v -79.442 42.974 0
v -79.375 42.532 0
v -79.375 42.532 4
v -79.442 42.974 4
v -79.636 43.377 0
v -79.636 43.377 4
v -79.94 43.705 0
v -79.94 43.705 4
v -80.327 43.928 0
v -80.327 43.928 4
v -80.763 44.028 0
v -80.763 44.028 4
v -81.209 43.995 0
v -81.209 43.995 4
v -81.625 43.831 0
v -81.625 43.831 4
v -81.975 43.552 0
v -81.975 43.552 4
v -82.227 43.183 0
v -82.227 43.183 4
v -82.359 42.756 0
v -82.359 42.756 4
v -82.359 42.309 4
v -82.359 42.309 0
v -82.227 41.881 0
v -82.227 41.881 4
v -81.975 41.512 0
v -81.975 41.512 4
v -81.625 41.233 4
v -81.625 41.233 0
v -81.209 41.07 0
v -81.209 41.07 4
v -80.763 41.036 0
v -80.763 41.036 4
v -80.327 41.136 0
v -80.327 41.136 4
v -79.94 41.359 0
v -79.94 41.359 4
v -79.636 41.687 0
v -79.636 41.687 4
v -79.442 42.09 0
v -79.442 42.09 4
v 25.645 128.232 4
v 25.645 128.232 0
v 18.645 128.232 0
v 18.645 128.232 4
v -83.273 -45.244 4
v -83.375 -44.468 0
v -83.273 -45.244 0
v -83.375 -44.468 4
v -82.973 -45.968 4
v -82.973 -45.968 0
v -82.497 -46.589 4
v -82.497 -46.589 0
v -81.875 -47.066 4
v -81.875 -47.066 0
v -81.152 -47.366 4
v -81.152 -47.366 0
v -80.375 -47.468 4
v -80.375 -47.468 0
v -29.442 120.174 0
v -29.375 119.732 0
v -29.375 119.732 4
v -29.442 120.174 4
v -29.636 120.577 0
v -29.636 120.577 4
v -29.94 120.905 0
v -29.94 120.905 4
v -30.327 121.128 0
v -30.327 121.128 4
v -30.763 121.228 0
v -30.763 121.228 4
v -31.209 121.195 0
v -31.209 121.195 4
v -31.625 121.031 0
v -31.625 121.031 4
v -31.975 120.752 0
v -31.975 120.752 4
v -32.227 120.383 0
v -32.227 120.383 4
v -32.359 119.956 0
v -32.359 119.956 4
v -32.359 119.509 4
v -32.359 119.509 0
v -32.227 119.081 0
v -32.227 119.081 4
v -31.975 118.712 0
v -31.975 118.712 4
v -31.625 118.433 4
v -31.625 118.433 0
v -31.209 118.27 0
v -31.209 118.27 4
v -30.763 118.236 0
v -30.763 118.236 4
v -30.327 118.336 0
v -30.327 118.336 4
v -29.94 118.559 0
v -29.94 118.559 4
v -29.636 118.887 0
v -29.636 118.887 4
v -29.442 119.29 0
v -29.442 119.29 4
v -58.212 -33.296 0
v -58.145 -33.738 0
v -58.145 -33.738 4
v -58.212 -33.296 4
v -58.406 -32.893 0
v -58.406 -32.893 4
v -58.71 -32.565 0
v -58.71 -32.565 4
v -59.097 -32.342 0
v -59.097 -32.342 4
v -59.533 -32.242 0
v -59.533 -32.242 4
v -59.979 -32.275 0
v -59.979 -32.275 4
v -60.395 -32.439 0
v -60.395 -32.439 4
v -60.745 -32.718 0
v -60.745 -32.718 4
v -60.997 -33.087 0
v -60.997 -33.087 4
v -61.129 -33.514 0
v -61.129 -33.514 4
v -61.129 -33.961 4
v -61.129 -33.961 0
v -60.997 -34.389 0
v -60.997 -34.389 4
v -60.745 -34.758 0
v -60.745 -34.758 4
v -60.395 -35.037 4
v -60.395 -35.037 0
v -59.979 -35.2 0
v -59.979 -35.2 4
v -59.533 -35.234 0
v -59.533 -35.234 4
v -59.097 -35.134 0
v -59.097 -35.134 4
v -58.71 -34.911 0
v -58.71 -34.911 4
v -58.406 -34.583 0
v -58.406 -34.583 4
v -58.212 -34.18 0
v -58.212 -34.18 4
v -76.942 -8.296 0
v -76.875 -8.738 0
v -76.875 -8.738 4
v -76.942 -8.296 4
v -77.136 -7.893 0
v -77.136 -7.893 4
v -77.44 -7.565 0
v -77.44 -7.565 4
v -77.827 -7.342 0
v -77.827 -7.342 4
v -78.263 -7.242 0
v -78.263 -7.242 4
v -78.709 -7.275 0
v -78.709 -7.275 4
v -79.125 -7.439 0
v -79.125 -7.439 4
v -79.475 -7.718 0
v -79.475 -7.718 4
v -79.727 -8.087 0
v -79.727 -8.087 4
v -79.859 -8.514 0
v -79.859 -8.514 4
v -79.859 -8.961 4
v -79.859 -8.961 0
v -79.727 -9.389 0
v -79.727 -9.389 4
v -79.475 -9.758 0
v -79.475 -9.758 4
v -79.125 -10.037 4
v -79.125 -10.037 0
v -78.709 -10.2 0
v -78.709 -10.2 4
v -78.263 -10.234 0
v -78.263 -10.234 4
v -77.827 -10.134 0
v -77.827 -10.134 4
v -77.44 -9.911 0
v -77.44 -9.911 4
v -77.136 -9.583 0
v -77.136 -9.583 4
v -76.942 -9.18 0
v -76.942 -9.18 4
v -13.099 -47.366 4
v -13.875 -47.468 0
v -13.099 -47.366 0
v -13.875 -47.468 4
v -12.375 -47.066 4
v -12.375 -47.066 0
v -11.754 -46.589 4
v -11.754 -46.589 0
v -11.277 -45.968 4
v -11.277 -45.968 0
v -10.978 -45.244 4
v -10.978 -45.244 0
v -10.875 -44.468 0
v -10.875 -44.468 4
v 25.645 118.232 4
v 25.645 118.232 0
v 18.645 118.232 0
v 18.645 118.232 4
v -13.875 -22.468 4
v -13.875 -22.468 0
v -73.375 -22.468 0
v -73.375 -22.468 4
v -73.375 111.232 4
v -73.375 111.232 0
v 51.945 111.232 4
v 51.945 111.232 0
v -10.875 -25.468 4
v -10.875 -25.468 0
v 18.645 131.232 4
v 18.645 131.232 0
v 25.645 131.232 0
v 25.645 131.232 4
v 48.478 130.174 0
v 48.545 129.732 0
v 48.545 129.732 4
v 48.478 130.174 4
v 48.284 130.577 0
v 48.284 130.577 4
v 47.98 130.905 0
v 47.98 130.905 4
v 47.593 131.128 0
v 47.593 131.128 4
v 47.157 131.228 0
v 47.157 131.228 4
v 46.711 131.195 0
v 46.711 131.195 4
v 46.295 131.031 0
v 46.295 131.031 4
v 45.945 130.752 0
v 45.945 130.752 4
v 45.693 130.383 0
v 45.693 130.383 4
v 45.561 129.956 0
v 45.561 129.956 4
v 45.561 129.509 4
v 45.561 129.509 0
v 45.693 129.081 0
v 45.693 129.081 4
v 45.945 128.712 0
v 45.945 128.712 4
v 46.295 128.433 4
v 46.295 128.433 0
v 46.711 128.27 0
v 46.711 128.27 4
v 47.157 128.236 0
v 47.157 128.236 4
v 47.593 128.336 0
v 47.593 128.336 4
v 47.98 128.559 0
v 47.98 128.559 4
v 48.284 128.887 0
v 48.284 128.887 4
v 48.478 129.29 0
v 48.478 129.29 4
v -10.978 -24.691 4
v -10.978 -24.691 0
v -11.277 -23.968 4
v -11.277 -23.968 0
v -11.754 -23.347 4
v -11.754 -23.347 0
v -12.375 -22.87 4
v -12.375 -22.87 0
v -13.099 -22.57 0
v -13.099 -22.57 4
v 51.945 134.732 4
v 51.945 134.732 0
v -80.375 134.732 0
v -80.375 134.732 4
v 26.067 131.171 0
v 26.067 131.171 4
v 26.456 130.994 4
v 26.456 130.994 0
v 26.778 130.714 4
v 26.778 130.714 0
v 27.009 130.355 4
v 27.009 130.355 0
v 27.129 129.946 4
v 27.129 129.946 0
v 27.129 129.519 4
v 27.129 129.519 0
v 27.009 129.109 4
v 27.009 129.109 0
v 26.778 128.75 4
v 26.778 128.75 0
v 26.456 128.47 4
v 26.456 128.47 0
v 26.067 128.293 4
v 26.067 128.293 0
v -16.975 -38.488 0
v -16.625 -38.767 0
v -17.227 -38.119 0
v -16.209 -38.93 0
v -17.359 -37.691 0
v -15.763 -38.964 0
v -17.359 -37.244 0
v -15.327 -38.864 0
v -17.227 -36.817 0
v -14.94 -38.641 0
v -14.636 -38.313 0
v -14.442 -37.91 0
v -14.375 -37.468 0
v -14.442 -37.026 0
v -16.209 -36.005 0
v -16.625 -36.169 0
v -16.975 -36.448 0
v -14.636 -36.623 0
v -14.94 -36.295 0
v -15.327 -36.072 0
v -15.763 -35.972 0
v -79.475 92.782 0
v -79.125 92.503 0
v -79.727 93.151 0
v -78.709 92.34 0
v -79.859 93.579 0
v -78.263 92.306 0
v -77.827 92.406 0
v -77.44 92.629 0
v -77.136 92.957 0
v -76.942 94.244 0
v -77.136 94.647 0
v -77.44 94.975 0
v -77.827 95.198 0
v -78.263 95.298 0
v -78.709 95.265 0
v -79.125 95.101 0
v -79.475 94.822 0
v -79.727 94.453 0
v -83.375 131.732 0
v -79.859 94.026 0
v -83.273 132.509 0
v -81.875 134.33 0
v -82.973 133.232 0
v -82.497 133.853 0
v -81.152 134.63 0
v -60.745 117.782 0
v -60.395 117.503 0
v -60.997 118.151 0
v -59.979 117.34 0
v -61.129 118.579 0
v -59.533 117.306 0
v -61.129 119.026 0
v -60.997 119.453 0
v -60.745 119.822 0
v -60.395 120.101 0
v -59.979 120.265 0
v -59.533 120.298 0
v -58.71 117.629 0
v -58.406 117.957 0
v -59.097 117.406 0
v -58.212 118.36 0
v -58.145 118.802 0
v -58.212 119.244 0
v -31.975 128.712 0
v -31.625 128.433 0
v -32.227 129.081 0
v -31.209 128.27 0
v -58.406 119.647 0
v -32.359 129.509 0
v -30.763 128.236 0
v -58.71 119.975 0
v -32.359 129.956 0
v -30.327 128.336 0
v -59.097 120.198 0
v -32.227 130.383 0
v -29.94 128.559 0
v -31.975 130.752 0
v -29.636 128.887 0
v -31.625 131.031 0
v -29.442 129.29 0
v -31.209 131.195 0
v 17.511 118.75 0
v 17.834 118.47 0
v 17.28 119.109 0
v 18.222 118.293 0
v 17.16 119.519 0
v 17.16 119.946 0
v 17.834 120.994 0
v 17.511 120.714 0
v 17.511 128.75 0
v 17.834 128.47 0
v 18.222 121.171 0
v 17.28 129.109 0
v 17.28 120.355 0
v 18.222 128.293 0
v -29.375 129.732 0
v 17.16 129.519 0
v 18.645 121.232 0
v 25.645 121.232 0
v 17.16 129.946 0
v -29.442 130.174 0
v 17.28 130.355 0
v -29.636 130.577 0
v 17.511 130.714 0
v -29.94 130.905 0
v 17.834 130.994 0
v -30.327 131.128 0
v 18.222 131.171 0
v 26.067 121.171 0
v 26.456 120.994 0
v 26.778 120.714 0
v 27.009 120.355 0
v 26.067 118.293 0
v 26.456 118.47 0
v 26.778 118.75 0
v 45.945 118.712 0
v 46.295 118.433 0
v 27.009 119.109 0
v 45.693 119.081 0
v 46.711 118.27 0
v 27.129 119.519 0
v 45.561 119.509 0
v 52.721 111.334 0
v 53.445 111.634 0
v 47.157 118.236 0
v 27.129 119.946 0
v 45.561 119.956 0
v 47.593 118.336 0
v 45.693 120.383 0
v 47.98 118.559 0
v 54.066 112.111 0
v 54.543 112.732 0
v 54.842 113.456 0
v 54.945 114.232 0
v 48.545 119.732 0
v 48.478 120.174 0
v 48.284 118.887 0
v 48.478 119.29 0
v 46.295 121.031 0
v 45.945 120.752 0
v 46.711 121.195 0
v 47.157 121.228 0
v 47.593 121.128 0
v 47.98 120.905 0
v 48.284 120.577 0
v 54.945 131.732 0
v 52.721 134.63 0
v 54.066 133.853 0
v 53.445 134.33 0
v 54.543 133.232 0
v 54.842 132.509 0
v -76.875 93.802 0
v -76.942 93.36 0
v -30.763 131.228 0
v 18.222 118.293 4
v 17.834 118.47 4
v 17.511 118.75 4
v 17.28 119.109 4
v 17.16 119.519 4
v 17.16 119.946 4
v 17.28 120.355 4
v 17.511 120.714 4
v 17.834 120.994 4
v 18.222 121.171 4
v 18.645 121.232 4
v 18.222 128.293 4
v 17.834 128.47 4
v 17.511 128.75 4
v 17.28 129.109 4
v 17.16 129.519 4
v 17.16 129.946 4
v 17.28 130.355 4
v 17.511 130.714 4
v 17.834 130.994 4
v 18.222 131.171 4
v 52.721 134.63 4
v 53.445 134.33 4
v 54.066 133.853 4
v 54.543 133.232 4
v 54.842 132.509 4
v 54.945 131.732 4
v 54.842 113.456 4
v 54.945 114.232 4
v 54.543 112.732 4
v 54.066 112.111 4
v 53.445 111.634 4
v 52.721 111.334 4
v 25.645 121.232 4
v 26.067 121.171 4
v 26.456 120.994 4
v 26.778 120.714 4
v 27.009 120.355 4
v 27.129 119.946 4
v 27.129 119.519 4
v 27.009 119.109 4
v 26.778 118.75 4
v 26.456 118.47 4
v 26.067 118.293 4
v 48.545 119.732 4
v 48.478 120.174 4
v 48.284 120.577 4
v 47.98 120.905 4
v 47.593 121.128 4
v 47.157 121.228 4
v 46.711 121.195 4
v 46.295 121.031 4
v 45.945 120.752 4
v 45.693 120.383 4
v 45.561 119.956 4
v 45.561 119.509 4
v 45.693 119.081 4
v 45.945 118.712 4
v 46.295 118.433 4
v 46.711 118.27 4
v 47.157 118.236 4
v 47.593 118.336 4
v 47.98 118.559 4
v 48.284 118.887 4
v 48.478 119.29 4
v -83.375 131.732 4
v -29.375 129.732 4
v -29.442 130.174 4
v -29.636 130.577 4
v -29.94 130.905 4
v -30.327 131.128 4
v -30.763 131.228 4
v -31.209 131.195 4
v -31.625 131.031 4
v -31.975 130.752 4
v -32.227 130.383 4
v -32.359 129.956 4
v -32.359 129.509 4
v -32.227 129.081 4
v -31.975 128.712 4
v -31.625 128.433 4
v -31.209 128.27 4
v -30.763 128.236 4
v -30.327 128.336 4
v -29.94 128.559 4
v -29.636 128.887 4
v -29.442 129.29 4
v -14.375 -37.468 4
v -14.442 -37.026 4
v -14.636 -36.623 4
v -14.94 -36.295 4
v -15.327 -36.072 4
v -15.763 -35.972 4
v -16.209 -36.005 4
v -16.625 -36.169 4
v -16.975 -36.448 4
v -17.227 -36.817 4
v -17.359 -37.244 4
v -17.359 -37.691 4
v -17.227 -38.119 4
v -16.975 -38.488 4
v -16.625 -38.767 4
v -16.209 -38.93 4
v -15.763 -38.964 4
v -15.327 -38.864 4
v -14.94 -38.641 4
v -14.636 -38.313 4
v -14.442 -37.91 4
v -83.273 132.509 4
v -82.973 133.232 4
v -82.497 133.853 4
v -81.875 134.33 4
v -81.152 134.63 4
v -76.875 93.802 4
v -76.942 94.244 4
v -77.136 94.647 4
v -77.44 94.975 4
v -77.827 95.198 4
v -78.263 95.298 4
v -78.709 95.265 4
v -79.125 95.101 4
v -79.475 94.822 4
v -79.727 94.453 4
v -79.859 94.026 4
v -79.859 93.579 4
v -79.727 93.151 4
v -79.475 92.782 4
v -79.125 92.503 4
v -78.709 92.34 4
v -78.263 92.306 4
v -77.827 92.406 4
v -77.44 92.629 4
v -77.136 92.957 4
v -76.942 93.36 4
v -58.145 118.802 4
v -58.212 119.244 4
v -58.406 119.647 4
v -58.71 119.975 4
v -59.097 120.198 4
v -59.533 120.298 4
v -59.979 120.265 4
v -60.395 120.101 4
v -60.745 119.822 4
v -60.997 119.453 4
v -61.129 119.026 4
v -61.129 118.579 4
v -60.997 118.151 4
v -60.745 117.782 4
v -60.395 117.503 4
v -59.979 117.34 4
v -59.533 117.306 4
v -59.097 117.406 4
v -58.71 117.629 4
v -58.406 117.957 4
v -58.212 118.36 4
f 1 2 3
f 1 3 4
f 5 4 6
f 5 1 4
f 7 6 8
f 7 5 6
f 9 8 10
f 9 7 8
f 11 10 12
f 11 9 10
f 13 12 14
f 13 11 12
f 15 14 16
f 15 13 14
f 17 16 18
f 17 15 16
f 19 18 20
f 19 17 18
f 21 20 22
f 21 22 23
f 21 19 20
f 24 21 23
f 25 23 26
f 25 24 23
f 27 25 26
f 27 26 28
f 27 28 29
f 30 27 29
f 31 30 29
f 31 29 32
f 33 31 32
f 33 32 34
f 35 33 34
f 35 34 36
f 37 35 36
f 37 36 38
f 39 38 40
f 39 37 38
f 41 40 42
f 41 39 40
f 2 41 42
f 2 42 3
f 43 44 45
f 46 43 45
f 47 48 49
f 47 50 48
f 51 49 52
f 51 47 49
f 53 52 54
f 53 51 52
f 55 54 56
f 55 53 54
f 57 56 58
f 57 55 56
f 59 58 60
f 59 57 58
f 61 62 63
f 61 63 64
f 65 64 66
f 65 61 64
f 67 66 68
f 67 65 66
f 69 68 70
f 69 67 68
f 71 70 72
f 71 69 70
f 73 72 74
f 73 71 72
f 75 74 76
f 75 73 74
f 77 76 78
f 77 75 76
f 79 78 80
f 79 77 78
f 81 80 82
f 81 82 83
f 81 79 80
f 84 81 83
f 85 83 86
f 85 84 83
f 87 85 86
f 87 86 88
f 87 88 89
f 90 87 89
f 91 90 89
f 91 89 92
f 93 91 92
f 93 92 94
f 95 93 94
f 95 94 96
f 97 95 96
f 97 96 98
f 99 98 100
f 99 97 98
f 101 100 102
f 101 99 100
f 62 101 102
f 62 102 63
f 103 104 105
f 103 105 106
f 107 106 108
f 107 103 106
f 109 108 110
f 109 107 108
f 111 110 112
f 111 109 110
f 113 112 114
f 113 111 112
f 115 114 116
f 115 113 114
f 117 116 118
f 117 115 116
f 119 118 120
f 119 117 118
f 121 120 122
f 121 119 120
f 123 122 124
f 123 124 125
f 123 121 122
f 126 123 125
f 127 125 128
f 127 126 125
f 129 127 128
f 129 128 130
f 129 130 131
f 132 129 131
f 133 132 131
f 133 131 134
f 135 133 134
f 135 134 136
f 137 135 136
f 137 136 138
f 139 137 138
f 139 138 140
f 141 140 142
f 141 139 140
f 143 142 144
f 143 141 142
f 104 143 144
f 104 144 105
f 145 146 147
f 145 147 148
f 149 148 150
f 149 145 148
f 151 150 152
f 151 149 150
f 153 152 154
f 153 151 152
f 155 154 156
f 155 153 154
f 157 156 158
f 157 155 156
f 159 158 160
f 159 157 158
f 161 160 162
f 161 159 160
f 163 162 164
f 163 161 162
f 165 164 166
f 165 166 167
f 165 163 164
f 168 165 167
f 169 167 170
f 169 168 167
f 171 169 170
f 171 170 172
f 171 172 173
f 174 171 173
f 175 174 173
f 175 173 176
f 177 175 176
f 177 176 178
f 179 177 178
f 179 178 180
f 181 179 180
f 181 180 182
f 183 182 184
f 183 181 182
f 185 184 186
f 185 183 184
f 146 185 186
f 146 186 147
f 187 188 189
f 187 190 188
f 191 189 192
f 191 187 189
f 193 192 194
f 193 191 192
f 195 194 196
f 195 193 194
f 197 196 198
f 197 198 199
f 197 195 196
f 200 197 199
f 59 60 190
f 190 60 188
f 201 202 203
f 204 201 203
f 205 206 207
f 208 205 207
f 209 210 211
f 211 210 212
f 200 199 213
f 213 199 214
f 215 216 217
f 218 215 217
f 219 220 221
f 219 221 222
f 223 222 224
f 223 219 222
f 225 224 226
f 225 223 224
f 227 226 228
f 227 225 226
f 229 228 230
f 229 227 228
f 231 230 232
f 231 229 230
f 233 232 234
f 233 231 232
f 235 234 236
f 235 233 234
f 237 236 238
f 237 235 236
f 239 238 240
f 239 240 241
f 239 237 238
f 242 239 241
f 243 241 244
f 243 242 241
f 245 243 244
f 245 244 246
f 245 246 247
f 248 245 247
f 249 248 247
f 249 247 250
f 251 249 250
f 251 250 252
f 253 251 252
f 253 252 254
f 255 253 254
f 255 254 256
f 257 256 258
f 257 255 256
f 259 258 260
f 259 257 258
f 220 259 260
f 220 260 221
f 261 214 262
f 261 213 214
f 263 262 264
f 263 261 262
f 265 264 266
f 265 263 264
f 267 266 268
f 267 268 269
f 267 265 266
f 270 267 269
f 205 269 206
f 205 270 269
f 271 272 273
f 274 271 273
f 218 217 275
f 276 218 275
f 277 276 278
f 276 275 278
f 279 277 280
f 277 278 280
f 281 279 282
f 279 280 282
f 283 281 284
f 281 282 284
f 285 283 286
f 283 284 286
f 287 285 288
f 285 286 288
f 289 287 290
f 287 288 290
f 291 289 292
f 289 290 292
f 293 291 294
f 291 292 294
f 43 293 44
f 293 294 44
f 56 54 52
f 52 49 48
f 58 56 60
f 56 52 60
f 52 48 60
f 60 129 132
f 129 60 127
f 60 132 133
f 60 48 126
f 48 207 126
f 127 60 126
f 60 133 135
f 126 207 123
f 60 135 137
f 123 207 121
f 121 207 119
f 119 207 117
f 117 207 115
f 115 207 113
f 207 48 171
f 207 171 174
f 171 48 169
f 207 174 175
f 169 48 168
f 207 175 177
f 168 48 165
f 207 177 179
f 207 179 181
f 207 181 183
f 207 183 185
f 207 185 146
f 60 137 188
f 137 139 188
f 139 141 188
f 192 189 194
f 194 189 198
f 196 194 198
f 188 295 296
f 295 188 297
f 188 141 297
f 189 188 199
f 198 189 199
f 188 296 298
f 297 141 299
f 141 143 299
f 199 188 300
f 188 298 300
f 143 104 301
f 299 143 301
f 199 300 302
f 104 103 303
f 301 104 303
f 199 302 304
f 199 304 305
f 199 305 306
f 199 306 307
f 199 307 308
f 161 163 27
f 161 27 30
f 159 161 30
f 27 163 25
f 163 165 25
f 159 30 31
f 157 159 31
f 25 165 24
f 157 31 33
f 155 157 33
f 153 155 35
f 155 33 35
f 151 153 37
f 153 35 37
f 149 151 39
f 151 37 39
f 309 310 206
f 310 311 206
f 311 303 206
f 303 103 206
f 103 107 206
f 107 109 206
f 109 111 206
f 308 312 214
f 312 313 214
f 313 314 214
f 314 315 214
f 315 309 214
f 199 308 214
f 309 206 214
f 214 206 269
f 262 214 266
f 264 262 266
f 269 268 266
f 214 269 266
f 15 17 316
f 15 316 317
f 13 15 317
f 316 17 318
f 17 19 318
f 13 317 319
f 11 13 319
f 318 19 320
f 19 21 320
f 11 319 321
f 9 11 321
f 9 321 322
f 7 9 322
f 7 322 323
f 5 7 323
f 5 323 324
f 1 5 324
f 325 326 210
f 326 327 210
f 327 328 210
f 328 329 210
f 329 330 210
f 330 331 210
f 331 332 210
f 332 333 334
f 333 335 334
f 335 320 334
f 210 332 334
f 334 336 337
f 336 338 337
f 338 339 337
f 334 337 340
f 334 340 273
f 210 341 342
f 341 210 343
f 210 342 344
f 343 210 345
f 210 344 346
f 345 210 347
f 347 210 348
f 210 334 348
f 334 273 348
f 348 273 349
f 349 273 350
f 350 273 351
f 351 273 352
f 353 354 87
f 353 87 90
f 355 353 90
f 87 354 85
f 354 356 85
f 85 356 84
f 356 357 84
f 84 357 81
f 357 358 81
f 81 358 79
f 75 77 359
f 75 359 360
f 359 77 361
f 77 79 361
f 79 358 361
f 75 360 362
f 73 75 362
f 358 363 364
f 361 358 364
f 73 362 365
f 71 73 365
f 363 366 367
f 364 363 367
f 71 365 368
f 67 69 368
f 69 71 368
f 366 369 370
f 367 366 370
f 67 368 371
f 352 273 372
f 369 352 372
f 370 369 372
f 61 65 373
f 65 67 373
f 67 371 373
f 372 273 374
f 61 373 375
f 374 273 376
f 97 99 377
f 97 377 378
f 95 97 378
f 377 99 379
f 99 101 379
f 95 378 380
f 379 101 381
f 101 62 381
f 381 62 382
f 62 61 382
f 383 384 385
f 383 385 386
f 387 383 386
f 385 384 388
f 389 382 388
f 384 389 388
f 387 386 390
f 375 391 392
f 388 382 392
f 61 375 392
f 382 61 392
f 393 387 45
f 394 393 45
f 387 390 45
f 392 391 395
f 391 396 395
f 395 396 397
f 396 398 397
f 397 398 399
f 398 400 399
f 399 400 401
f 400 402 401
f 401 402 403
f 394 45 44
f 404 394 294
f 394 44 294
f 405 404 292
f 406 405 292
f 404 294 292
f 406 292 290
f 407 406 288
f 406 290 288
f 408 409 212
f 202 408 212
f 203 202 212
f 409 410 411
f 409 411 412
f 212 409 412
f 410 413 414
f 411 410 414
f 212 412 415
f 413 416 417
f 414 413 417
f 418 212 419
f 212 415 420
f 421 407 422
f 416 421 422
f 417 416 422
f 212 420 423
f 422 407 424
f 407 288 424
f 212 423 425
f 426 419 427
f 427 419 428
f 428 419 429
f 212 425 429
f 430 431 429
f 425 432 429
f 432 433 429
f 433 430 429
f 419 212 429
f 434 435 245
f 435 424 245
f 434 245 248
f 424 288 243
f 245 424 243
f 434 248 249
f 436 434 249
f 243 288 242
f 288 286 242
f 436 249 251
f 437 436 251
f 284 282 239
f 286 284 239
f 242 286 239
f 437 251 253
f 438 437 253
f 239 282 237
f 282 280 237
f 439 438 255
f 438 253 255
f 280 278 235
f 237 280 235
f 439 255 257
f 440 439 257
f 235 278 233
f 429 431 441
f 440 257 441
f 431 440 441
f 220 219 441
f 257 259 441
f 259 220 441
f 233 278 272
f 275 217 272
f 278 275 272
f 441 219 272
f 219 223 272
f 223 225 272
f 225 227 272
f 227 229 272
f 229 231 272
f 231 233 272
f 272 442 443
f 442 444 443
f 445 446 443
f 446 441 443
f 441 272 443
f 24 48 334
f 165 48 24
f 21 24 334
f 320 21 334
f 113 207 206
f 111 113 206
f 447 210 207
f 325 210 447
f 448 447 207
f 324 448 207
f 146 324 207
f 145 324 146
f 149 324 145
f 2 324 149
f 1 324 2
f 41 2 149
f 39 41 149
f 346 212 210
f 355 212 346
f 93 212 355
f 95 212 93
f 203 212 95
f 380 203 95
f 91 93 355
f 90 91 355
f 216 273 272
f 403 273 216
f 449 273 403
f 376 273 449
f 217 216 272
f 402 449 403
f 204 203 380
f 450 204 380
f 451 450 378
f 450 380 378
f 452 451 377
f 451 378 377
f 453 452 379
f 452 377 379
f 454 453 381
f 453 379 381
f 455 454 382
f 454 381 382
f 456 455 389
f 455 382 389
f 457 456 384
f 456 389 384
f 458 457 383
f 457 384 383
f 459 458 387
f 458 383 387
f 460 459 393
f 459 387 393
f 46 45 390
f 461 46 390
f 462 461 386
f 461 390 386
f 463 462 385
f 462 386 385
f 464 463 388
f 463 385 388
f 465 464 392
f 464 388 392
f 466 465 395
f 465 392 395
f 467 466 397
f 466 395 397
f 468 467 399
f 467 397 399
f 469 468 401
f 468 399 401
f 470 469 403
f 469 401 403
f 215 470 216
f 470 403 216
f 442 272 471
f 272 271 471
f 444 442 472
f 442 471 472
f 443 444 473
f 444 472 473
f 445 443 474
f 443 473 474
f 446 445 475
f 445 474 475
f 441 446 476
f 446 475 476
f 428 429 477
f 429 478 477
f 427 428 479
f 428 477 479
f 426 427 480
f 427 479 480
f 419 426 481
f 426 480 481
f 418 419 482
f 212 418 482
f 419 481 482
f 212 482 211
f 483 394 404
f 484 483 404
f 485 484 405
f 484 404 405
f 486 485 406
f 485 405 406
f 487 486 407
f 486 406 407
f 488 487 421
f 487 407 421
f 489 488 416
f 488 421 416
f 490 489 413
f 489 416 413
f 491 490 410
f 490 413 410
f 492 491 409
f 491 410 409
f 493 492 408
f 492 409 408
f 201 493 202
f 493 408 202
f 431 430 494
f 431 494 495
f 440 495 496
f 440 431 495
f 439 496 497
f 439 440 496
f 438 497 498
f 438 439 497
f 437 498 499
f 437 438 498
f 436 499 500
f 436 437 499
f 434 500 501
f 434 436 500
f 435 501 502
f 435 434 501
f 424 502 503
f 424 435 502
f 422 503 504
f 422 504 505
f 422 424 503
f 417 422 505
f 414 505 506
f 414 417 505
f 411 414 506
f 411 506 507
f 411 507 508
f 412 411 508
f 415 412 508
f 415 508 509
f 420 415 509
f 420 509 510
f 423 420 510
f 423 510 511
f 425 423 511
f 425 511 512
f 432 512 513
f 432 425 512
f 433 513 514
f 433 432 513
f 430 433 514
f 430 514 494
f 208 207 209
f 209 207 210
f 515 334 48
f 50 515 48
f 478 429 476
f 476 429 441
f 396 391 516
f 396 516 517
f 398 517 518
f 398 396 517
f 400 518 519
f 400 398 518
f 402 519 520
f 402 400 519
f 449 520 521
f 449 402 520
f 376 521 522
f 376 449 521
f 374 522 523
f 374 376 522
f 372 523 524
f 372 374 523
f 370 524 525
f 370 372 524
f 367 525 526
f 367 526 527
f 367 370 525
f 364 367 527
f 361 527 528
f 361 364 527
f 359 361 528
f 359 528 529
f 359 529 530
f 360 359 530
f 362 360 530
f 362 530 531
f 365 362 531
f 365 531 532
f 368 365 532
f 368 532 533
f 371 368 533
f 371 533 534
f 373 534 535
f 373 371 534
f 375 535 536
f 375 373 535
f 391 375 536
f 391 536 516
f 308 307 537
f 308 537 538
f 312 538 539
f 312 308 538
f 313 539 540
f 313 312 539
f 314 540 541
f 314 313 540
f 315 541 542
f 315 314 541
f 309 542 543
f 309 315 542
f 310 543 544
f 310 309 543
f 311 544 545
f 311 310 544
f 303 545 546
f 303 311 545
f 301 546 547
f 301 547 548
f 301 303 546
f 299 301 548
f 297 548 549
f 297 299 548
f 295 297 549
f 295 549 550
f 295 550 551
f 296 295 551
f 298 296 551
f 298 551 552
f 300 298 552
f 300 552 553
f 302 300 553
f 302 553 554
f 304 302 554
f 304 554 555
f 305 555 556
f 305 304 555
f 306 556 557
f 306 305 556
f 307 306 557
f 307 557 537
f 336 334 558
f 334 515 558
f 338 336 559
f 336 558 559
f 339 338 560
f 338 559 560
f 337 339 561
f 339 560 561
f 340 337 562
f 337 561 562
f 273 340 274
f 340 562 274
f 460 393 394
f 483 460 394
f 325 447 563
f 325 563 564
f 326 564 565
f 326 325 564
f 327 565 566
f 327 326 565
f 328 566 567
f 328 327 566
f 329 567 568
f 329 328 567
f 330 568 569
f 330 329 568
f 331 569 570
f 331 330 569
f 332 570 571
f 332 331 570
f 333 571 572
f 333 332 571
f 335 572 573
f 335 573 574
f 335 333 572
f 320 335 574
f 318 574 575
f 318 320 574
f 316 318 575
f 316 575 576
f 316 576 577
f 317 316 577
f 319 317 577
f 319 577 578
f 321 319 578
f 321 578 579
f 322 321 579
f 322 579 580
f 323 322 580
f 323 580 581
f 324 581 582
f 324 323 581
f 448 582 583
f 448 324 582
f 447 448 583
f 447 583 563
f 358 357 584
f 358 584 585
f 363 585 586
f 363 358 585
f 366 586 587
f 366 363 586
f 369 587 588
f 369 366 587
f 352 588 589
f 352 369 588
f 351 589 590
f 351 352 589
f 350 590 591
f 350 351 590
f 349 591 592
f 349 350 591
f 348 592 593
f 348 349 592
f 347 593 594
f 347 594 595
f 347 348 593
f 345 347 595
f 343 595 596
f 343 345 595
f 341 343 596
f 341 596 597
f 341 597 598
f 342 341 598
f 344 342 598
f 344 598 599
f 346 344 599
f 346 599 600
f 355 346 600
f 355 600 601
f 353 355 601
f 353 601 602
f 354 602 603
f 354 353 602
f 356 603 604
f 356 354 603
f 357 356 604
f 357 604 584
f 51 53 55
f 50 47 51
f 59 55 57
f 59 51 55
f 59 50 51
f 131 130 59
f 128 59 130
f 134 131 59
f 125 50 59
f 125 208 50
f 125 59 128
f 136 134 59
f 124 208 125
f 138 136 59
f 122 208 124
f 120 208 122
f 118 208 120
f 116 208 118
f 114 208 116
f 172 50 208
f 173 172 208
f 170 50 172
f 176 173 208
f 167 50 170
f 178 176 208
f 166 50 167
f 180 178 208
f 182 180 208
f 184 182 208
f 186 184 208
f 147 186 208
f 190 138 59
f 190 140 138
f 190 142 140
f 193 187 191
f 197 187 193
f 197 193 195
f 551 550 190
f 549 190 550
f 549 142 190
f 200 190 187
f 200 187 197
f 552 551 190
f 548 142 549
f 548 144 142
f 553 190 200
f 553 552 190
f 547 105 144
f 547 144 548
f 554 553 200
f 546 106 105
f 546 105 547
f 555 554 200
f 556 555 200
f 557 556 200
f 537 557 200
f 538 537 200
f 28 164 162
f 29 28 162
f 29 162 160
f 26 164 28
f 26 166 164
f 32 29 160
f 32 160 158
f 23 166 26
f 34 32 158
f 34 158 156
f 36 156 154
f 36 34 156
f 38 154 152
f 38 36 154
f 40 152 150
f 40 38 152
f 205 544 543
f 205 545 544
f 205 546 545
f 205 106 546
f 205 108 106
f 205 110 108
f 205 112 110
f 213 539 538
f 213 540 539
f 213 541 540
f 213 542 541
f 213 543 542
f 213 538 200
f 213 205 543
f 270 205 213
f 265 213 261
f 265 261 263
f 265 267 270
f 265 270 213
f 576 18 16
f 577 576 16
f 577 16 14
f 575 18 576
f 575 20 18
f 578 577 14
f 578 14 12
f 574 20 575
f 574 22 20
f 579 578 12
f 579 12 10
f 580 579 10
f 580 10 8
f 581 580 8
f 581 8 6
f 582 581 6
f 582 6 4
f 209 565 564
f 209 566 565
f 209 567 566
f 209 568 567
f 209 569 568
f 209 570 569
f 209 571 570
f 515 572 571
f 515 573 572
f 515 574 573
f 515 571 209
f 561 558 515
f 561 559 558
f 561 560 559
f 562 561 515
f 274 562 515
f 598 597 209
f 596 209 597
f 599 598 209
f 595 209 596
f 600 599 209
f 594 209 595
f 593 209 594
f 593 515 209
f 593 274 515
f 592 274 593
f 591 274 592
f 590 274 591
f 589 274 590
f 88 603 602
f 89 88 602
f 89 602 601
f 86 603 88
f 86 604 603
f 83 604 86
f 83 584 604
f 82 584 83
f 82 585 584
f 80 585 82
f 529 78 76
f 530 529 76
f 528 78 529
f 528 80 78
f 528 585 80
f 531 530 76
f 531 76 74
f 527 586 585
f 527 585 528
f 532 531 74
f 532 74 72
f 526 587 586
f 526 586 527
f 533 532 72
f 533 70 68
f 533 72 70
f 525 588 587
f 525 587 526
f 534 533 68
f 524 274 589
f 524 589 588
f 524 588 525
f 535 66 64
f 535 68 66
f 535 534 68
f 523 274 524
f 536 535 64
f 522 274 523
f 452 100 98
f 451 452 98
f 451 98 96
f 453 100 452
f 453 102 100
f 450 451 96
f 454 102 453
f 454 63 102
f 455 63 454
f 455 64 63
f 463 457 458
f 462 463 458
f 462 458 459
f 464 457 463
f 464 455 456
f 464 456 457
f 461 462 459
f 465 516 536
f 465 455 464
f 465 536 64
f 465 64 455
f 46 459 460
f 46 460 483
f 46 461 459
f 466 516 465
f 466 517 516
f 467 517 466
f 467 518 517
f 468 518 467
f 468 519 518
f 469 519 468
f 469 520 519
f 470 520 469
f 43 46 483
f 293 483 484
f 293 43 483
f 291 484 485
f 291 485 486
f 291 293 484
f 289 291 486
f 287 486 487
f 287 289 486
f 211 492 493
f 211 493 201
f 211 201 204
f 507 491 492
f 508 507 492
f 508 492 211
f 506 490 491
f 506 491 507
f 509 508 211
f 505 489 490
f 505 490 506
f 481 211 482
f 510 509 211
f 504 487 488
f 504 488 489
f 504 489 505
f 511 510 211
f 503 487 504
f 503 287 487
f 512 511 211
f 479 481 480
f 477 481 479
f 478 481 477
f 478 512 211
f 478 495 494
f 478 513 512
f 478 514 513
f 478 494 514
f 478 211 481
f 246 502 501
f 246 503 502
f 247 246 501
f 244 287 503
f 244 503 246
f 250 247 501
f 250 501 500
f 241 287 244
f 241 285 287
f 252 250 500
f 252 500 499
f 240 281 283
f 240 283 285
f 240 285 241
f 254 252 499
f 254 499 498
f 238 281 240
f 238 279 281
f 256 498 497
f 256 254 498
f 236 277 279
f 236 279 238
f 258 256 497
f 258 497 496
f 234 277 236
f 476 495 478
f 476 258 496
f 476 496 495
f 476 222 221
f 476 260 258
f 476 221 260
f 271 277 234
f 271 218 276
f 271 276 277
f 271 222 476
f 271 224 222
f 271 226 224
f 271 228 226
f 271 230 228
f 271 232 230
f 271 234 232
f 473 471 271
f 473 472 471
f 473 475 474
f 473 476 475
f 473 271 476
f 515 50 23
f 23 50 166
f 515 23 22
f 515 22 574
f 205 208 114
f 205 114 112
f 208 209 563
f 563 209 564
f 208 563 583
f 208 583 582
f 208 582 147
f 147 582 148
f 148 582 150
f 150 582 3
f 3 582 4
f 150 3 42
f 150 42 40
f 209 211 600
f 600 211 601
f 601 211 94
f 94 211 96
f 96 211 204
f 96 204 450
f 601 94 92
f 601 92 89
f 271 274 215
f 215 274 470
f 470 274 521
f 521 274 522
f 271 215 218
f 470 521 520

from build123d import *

# Parameters (mm, degrees)
SKETCH_2_R      = 1.5
EXTRUDE_3_DEPTH = 4
FILLET_1_R      = 3


with BuildPart() as part:
    # 草图2 → 凸台-拉伸3 (new body)
    with BuildSketch(Plane.XY):
        Polygon((-83.375314497, 134.732138716), (-83.375314497, -47.467861284), (-10.875314497, -47.467861284), (-10.875314497, -22.467861284), (-73.375314497, -22.467861284), (-73.375314497, 111.232138716), (54.944685503, 111.232138716), (54.944685503, 134.732138716), align=None)
        with Locations((-59.645314497, -33.737861284)):
            Circle(SKETCH_2_R, mode=Mode.SUBTRACT)
        with Locations((-15.875314497, -37.467861284)):
            Circle(SKETCH_2_R, mode=Mode.SUBTRACT)
        with Locations((-78.375314497, -8.737861284)):
            Circle(SKETCH_2_R, mode=Mode.SUBTRACT)
        with Locations((-80.875314497, 42.532138716)):
            Circle(SKETCH_2_R, mode=Mode.SUBTRACT)
        with Locations((-78.375314497, 93.802138716)):
            Circle(SKETCH_2_R, mode=Mode.SUBTRACT)
        with Locations((-59.645314497, 118.802138716)):
            Circle(SKETCH_2_R, mode=Mode.SUBTRACT)
        with Locations((-30.875314497, 119.732138716)):
            Circle(SKETCH_2_R, mode=Mode.SUBTRACT)
        with Locations((-30.875314497, 129.732138716)):
            Circle(SKETCH_2_R, mode=Mode.SUBTRACT)
        with BuildLine():
            ThreePointArc((25.644685503, 131.232138716), (27.144685503, 129.732138716), (25.644685503, 128.232138716))
            Line((25.644685503, 128.232138716), (18.644685503, 128.232138716))
            ThreePointArc((18.644685503, 128.232138716), (17.144685503, 129.732138716), (18.644685503, 131.232138716))
            Line((18.644685503, 131.232138716), (25.644685503, 131.232138716))
        make_face(mode=Mode.SUBTRACT)
        with BuildLine():
            Line((25.644685503, 118.232138716), (18.644685503, 118.232138716))
            ThreePointArc((18.644685503, 118.232138716), (17.144685503, 119.732138716), (18.644685503, 121.232138716))
            Line((18.644685503, 121.232138716), (25.644685503, 121.232138716))
            ThreePointArc((25.644685503, 121.232138716), (27.144685503, 119.732138716), (25.644685503, 118.232138716))
        make_face(mode=Mode.SUBTRACT)
        with Locations((47.044685503, 129.732138716)):
            Circle(SKETCH_2_R, mode=Mode.SUBTRACT)
        with Locations((47.044685503, 119.732138716)):
            Circle(SKETCH_2_R, mode=Mode.SUBTRACT)
    extrude(amount=EXTRUDE_3_DEPTH)

    # 圆角1
    fillet_1_edges = [part.edges().sort_by_distance(p)[0] for p in [
        (-10.875314497, -22.467861284, 2),
        (-10.875314497, -47.467861284, 2),
        (-83.375314497, -47.467861284, 2),
        (-83.375314497, 134.732138716, 2),
        (54.944685503, 134.732138716, 2),
        (54.944685503, 111.232138716, 2),
    ]]
    fillet(fillet_1_edges, radius=FILLET_1_R)


solid = part.part
